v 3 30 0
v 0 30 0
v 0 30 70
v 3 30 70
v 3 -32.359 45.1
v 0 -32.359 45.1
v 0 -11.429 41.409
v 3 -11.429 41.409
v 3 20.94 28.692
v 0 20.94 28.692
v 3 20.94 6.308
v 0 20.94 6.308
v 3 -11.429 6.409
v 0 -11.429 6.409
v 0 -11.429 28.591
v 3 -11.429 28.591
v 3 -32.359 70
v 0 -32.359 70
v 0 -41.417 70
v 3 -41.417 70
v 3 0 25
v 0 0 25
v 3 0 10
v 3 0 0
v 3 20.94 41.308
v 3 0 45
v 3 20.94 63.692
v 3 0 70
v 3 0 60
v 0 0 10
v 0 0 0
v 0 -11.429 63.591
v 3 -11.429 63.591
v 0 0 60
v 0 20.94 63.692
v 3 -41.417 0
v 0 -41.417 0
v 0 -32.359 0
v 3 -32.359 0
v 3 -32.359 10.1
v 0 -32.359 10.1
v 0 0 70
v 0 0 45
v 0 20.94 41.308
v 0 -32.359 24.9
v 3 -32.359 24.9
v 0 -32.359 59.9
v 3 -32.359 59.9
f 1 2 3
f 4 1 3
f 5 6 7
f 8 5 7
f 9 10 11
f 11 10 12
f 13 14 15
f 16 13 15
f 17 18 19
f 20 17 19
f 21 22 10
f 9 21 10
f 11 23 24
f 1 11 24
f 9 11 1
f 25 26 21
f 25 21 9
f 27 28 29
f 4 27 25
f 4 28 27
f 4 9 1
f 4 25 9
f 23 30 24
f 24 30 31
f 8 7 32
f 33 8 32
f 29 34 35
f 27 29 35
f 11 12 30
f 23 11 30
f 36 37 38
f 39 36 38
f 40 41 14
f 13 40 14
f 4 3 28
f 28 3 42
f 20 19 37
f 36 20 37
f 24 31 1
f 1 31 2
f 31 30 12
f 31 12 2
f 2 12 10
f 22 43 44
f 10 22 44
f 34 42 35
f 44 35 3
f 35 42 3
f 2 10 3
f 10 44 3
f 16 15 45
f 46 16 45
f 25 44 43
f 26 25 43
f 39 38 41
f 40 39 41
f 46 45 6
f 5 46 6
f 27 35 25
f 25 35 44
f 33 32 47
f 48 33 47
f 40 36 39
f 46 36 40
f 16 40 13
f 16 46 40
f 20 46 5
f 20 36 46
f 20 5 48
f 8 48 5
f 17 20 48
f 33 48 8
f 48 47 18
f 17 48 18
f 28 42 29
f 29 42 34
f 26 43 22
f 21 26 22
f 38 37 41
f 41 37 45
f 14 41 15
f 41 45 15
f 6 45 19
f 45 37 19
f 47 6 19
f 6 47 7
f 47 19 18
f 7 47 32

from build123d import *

# Parameters (mm, degrees)
F1_DEPTH = 3


with BuildPart() as f1:
    # F0 (on Right) → F1 (new body)
    with BuildSketch(Plane.YZ):
        Polygon((-41.416655, 0), (-32.358725, 0), (-32.358725, 10.1), (-11.428725, 6.409476), (-11.428725, 28.590524), (-32.358725, 24.9), (-32.358725, 35), (-32.358725, 45.1), (-11.428725, 41.409476), (-11.428725, 63.590524), (-32.358725, 59.9), (-32.358725, 70), (-41.416655, 70), align=None)
        Polygon((0, 10), (0, 0), (30, 0), (30, 70), (0, 70), (0, 60), (20.940275, 63.692335), (20.940275, 41.307665), (0, 45), (0, 35), (0, 25), (20.940275, 28.692335), (20.940275, 6.307665), align=None)
    extrude(amount=F1_DEPTH)


solid = f1.part
